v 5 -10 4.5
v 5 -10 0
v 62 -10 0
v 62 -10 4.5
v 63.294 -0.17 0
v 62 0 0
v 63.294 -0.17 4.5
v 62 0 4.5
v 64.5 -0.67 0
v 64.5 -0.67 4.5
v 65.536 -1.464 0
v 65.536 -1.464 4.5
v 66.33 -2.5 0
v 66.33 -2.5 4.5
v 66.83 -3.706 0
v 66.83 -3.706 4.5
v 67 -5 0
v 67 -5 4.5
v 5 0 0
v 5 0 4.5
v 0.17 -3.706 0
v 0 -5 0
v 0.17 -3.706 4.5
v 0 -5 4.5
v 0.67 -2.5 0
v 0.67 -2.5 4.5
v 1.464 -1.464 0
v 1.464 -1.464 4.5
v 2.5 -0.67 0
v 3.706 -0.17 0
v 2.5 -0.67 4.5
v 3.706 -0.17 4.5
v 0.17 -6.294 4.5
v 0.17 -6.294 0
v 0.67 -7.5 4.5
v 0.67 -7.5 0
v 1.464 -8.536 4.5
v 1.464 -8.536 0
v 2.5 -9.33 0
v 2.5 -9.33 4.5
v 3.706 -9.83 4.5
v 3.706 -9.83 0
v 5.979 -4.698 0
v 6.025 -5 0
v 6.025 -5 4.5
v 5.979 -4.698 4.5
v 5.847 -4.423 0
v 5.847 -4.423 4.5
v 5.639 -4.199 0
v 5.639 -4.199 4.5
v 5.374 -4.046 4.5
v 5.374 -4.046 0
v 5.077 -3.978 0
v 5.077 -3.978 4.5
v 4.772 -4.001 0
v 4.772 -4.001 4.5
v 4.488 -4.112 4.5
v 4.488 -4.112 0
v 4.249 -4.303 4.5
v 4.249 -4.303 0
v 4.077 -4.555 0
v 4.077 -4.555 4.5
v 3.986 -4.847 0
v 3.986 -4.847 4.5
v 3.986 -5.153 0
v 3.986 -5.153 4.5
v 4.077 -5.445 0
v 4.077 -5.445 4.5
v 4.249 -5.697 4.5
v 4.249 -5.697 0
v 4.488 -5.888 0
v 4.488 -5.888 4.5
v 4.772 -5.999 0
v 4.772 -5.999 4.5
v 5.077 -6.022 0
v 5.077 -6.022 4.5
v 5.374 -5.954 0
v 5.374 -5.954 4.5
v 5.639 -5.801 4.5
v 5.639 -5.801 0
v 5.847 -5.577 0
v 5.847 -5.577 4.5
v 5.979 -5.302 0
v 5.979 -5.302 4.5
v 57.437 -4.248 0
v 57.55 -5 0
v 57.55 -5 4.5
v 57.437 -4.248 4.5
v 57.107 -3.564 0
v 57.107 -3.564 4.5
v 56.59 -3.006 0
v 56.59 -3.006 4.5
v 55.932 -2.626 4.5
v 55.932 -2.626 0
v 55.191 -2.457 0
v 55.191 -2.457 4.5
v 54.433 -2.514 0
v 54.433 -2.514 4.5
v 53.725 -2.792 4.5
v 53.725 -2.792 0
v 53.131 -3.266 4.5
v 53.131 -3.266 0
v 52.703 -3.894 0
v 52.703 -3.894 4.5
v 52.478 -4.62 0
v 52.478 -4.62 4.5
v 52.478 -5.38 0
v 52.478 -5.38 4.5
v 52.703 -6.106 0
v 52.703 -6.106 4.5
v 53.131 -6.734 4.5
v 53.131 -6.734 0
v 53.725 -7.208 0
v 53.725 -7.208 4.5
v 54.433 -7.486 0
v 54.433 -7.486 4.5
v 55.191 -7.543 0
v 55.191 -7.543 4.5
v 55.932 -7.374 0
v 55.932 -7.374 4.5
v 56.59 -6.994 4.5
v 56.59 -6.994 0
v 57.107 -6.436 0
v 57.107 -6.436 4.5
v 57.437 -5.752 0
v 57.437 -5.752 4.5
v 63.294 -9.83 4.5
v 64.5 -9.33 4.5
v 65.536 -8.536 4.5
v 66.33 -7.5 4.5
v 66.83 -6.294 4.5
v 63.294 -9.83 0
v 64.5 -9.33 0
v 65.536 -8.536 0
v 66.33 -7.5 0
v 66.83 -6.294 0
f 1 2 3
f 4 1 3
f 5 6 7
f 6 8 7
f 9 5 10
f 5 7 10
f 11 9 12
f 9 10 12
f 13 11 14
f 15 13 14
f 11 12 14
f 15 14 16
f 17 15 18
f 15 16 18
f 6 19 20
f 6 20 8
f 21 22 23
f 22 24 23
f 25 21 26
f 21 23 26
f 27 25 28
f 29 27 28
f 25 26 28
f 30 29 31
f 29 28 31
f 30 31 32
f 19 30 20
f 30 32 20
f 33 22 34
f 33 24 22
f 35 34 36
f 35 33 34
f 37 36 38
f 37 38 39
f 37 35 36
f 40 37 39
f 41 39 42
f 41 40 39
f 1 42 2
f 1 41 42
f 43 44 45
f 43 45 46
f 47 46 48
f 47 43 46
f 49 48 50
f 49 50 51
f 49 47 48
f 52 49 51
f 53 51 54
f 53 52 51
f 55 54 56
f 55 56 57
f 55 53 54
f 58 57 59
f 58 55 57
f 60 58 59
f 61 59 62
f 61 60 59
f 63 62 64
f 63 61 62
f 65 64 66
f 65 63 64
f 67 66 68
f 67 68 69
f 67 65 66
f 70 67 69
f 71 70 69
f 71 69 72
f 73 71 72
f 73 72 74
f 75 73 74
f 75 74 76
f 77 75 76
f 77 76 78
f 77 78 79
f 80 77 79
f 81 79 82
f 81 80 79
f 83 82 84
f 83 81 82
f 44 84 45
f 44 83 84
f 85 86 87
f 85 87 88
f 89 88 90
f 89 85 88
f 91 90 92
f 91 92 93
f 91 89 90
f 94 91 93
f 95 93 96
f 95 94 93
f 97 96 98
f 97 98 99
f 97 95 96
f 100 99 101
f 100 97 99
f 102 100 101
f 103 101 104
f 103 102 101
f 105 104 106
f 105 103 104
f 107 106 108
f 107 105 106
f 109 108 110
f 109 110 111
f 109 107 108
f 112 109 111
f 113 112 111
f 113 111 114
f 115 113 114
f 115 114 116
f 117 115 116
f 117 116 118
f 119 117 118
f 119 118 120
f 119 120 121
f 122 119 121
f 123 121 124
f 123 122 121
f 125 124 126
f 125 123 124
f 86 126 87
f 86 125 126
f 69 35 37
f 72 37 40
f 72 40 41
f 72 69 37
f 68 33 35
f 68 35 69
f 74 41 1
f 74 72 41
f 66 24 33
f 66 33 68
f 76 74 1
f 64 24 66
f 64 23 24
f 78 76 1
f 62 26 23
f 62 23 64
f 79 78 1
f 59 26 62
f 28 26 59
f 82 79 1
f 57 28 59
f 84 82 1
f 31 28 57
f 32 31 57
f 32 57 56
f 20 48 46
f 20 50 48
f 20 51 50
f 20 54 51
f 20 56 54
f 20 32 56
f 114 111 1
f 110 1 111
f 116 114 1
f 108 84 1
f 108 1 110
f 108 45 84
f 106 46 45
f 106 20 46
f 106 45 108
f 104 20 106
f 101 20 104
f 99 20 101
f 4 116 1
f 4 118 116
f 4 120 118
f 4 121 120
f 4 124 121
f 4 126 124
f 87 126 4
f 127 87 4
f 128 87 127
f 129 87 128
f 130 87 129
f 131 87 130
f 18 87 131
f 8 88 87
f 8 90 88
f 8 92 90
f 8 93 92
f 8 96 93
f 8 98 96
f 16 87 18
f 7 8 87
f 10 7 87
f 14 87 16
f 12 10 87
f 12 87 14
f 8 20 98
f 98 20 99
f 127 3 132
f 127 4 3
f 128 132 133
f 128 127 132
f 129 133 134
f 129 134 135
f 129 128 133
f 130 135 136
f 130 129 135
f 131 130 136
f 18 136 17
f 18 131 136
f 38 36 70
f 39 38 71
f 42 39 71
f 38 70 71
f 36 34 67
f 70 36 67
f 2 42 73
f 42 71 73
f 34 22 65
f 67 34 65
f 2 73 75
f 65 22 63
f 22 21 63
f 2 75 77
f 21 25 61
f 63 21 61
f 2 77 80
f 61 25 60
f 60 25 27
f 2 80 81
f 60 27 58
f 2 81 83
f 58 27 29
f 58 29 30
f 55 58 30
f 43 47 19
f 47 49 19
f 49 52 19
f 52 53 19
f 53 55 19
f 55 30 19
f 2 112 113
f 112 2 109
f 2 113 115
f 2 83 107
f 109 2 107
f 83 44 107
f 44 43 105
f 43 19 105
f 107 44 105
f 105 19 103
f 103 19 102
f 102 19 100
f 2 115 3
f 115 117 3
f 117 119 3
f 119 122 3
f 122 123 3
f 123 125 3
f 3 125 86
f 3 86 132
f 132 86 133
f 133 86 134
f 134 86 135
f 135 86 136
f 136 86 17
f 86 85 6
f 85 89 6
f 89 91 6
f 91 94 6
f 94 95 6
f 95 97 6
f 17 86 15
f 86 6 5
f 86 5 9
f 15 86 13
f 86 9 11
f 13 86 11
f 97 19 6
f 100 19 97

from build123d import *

# Parameters (mm, degrees)
SKETCH_1_W      = 67
SKETCH_1_H      = 10
SKETCH_1_R      = 1.025
SKETCH_1_R_2    = 2.55
EXTRUDE_1_DEPTH = 4.5
FILLET_1_R      = 5


with BuildPart() as part:
    # 草图1 → 凸台-拉伸1 (new body)
    with BuildSketch(Plane.XY):
        with Locations((33.5, -5)):
            Rectangle(SKETCH_1_W, SKETCH_1_H)
        with Locations((5, -5)):
            Circle(SKETCH_1_R, mode=Mode.SUBTRACT)
        with Locations((55, -5)):
            Circle(SKETCH_1_R_2, mode=Mode.SUBTRACT)
    extrude(amount=EXTRUDE_1_DEPTH)

    # 圆角1
    fillet_1_edges = [part.edges().sort_by_distance(p)[0] for p in [
        (0, -10, 2.25),
        (67, -10, 2.25),
        (67, 0, 2.25),
        (0, 0, 2.25),
    ]]
    fillet(fillet_1_edges, radius=FILLET_1_R - 0.0001)  # a hair under: the kernel refuses the full size


solid = part.part
